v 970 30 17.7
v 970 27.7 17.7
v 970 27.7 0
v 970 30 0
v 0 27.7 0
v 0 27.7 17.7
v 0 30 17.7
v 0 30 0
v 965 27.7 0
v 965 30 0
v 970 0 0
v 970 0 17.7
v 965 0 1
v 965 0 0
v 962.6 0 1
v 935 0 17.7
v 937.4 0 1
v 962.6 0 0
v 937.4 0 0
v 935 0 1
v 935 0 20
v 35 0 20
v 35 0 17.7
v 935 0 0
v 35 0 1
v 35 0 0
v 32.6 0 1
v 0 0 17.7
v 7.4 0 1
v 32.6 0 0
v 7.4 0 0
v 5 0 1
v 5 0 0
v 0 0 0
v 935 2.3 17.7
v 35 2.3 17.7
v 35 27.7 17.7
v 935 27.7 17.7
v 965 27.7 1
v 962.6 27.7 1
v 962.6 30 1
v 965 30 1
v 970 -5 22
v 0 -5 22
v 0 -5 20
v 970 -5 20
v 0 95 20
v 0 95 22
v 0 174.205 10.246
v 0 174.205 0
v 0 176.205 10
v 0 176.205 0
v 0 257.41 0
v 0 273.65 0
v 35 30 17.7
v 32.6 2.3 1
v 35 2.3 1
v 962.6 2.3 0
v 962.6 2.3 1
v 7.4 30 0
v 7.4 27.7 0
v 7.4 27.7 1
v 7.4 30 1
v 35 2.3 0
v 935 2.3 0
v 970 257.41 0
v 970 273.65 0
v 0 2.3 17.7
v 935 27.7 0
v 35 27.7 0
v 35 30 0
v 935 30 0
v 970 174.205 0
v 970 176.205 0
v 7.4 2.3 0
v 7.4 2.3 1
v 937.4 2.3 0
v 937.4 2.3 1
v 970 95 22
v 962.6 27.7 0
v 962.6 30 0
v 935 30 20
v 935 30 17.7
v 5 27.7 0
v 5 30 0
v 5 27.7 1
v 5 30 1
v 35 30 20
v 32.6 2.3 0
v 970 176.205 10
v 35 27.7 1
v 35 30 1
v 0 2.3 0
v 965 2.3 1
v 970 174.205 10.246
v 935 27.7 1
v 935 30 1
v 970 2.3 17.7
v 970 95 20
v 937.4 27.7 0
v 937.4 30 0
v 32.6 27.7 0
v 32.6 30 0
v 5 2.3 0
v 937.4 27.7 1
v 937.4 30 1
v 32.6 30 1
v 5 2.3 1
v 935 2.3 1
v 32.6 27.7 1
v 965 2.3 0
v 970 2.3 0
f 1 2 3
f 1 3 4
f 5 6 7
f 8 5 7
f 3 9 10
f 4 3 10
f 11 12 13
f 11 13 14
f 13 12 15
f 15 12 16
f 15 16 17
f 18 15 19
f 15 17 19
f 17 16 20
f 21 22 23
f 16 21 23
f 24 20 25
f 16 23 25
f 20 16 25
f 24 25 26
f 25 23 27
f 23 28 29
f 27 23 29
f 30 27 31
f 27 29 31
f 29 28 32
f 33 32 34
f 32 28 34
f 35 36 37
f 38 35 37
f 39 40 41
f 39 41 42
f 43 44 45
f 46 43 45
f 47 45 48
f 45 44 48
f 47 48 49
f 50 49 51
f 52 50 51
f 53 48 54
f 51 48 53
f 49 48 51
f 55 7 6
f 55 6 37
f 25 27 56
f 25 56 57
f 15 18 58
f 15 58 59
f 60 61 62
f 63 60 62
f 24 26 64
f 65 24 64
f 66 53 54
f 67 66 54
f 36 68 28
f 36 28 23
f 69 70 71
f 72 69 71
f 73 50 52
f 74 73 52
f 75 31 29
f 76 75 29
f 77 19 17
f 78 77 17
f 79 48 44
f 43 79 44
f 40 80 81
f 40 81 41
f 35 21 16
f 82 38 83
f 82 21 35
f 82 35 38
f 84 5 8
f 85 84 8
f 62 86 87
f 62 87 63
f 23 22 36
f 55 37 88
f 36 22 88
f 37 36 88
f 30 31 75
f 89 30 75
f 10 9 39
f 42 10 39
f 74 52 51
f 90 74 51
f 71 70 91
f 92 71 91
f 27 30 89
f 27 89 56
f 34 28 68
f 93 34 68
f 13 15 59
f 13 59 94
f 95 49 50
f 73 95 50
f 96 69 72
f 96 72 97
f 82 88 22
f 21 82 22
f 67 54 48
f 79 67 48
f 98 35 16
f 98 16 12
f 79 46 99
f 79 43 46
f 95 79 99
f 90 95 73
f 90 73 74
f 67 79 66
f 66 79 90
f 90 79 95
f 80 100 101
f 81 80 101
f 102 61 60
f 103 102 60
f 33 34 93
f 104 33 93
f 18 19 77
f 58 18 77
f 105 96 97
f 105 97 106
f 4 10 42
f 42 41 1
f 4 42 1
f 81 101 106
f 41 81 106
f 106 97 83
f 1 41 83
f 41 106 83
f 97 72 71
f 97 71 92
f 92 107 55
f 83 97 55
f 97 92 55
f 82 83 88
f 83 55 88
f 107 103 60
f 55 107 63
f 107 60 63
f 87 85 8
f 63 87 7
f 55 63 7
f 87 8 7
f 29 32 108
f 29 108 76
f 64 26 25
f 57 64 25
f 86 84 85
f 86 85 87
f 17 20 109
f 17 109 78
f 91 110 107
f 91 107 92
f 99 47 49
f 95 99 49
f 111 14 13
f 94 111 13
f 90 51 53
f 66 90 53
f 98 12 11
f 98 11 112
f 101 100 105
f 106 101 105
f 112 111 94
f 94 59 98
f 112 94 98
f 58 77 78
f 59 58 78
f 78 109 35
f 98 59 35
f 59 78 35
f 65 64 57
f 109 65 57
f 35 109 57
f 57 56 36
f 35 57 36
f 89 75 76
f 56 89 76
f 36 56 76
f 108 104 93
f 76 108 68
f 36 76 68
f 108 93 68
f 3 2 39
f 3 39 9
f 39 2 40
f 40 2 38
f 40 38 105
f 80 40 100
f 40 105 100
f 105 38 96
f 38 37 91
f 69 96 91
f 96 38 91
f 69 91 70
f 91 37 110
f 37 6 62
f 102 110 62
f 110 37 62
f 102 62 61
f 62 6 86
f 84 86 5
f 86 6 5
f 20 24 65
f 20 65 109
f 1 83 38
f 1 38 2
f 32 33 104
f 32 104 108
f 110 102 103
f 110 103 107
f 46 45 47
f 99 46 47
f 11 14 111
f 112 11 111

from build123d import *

# Parameters (mm, degrees)
F1_DEPTH = 970
F2_W     = 35
F2_H     = 30
F3_DEPTH = 2.3
F4_W     = 2.4
F4_H     = 1
F5_DEPTH = 30.001
F7_DEPTH = 970


with BuildPart() as f1:
    # F0 (on Right) → F1 (new body)
    with BuildSketch(Plane.YZ):
        Polygon((0, 20), (0, 0), (2.3, 0), (2.3, 17.7), (27.7, 17.7), (27.7, 0), (30, 0), (30, 20), align=None)
    extrude(amount=F1_DEPTH)

    # F2 (on face) → F3 (cut)
    with BuildSketch(Plane.XY.offset(20)):
        with Locations((17.5, 15)):
            Rectangle(F2_W, F2_H)
        with Locations((952.5, 15)):
            Rectangle(F2_W, F2_H)
    extrude(amount=-F3_DEPTH, mode=Mode.SUBTRACT)

    # F4 (on face) → F5 (cut, through all)
    with BuildSketch(Plane.XZ):
        with Locations((33.8, 0.5)):
            Rectangle(F4_W, F4_H)
        with Locations((6.2, 0.5)):
            Rectangle(F4_W, F4_H)
        with Locations((936.2, 0.5)):
            Rectangle(F4_W, F4_H)
        with Locations((963.8, 0.5)):
            Rectangle(F4_W, F4_H)
    extrude(amount=-F5_DEPTH, mode=Mode.SUBTRACT)


with BuildPart() as f7:
    # F6 (on Right) → F7 (new body)
    with BuildSketch(Plane.YZ):
        Polygon((-5, 20), (95, 20), (174.204771, 10.246291), (176.204771, 10), (257.409543, 0), (273.650497, 0), (95, 22), (-5, 22), align=None)
        Polygon((176.204771, 10), (174.204771, 10.246291), (174.204771, 0), (176.204771, 0), align=None)
    extrude(amount=F7_DEPTH)


solid = Compound([f1.part, f7.part])
